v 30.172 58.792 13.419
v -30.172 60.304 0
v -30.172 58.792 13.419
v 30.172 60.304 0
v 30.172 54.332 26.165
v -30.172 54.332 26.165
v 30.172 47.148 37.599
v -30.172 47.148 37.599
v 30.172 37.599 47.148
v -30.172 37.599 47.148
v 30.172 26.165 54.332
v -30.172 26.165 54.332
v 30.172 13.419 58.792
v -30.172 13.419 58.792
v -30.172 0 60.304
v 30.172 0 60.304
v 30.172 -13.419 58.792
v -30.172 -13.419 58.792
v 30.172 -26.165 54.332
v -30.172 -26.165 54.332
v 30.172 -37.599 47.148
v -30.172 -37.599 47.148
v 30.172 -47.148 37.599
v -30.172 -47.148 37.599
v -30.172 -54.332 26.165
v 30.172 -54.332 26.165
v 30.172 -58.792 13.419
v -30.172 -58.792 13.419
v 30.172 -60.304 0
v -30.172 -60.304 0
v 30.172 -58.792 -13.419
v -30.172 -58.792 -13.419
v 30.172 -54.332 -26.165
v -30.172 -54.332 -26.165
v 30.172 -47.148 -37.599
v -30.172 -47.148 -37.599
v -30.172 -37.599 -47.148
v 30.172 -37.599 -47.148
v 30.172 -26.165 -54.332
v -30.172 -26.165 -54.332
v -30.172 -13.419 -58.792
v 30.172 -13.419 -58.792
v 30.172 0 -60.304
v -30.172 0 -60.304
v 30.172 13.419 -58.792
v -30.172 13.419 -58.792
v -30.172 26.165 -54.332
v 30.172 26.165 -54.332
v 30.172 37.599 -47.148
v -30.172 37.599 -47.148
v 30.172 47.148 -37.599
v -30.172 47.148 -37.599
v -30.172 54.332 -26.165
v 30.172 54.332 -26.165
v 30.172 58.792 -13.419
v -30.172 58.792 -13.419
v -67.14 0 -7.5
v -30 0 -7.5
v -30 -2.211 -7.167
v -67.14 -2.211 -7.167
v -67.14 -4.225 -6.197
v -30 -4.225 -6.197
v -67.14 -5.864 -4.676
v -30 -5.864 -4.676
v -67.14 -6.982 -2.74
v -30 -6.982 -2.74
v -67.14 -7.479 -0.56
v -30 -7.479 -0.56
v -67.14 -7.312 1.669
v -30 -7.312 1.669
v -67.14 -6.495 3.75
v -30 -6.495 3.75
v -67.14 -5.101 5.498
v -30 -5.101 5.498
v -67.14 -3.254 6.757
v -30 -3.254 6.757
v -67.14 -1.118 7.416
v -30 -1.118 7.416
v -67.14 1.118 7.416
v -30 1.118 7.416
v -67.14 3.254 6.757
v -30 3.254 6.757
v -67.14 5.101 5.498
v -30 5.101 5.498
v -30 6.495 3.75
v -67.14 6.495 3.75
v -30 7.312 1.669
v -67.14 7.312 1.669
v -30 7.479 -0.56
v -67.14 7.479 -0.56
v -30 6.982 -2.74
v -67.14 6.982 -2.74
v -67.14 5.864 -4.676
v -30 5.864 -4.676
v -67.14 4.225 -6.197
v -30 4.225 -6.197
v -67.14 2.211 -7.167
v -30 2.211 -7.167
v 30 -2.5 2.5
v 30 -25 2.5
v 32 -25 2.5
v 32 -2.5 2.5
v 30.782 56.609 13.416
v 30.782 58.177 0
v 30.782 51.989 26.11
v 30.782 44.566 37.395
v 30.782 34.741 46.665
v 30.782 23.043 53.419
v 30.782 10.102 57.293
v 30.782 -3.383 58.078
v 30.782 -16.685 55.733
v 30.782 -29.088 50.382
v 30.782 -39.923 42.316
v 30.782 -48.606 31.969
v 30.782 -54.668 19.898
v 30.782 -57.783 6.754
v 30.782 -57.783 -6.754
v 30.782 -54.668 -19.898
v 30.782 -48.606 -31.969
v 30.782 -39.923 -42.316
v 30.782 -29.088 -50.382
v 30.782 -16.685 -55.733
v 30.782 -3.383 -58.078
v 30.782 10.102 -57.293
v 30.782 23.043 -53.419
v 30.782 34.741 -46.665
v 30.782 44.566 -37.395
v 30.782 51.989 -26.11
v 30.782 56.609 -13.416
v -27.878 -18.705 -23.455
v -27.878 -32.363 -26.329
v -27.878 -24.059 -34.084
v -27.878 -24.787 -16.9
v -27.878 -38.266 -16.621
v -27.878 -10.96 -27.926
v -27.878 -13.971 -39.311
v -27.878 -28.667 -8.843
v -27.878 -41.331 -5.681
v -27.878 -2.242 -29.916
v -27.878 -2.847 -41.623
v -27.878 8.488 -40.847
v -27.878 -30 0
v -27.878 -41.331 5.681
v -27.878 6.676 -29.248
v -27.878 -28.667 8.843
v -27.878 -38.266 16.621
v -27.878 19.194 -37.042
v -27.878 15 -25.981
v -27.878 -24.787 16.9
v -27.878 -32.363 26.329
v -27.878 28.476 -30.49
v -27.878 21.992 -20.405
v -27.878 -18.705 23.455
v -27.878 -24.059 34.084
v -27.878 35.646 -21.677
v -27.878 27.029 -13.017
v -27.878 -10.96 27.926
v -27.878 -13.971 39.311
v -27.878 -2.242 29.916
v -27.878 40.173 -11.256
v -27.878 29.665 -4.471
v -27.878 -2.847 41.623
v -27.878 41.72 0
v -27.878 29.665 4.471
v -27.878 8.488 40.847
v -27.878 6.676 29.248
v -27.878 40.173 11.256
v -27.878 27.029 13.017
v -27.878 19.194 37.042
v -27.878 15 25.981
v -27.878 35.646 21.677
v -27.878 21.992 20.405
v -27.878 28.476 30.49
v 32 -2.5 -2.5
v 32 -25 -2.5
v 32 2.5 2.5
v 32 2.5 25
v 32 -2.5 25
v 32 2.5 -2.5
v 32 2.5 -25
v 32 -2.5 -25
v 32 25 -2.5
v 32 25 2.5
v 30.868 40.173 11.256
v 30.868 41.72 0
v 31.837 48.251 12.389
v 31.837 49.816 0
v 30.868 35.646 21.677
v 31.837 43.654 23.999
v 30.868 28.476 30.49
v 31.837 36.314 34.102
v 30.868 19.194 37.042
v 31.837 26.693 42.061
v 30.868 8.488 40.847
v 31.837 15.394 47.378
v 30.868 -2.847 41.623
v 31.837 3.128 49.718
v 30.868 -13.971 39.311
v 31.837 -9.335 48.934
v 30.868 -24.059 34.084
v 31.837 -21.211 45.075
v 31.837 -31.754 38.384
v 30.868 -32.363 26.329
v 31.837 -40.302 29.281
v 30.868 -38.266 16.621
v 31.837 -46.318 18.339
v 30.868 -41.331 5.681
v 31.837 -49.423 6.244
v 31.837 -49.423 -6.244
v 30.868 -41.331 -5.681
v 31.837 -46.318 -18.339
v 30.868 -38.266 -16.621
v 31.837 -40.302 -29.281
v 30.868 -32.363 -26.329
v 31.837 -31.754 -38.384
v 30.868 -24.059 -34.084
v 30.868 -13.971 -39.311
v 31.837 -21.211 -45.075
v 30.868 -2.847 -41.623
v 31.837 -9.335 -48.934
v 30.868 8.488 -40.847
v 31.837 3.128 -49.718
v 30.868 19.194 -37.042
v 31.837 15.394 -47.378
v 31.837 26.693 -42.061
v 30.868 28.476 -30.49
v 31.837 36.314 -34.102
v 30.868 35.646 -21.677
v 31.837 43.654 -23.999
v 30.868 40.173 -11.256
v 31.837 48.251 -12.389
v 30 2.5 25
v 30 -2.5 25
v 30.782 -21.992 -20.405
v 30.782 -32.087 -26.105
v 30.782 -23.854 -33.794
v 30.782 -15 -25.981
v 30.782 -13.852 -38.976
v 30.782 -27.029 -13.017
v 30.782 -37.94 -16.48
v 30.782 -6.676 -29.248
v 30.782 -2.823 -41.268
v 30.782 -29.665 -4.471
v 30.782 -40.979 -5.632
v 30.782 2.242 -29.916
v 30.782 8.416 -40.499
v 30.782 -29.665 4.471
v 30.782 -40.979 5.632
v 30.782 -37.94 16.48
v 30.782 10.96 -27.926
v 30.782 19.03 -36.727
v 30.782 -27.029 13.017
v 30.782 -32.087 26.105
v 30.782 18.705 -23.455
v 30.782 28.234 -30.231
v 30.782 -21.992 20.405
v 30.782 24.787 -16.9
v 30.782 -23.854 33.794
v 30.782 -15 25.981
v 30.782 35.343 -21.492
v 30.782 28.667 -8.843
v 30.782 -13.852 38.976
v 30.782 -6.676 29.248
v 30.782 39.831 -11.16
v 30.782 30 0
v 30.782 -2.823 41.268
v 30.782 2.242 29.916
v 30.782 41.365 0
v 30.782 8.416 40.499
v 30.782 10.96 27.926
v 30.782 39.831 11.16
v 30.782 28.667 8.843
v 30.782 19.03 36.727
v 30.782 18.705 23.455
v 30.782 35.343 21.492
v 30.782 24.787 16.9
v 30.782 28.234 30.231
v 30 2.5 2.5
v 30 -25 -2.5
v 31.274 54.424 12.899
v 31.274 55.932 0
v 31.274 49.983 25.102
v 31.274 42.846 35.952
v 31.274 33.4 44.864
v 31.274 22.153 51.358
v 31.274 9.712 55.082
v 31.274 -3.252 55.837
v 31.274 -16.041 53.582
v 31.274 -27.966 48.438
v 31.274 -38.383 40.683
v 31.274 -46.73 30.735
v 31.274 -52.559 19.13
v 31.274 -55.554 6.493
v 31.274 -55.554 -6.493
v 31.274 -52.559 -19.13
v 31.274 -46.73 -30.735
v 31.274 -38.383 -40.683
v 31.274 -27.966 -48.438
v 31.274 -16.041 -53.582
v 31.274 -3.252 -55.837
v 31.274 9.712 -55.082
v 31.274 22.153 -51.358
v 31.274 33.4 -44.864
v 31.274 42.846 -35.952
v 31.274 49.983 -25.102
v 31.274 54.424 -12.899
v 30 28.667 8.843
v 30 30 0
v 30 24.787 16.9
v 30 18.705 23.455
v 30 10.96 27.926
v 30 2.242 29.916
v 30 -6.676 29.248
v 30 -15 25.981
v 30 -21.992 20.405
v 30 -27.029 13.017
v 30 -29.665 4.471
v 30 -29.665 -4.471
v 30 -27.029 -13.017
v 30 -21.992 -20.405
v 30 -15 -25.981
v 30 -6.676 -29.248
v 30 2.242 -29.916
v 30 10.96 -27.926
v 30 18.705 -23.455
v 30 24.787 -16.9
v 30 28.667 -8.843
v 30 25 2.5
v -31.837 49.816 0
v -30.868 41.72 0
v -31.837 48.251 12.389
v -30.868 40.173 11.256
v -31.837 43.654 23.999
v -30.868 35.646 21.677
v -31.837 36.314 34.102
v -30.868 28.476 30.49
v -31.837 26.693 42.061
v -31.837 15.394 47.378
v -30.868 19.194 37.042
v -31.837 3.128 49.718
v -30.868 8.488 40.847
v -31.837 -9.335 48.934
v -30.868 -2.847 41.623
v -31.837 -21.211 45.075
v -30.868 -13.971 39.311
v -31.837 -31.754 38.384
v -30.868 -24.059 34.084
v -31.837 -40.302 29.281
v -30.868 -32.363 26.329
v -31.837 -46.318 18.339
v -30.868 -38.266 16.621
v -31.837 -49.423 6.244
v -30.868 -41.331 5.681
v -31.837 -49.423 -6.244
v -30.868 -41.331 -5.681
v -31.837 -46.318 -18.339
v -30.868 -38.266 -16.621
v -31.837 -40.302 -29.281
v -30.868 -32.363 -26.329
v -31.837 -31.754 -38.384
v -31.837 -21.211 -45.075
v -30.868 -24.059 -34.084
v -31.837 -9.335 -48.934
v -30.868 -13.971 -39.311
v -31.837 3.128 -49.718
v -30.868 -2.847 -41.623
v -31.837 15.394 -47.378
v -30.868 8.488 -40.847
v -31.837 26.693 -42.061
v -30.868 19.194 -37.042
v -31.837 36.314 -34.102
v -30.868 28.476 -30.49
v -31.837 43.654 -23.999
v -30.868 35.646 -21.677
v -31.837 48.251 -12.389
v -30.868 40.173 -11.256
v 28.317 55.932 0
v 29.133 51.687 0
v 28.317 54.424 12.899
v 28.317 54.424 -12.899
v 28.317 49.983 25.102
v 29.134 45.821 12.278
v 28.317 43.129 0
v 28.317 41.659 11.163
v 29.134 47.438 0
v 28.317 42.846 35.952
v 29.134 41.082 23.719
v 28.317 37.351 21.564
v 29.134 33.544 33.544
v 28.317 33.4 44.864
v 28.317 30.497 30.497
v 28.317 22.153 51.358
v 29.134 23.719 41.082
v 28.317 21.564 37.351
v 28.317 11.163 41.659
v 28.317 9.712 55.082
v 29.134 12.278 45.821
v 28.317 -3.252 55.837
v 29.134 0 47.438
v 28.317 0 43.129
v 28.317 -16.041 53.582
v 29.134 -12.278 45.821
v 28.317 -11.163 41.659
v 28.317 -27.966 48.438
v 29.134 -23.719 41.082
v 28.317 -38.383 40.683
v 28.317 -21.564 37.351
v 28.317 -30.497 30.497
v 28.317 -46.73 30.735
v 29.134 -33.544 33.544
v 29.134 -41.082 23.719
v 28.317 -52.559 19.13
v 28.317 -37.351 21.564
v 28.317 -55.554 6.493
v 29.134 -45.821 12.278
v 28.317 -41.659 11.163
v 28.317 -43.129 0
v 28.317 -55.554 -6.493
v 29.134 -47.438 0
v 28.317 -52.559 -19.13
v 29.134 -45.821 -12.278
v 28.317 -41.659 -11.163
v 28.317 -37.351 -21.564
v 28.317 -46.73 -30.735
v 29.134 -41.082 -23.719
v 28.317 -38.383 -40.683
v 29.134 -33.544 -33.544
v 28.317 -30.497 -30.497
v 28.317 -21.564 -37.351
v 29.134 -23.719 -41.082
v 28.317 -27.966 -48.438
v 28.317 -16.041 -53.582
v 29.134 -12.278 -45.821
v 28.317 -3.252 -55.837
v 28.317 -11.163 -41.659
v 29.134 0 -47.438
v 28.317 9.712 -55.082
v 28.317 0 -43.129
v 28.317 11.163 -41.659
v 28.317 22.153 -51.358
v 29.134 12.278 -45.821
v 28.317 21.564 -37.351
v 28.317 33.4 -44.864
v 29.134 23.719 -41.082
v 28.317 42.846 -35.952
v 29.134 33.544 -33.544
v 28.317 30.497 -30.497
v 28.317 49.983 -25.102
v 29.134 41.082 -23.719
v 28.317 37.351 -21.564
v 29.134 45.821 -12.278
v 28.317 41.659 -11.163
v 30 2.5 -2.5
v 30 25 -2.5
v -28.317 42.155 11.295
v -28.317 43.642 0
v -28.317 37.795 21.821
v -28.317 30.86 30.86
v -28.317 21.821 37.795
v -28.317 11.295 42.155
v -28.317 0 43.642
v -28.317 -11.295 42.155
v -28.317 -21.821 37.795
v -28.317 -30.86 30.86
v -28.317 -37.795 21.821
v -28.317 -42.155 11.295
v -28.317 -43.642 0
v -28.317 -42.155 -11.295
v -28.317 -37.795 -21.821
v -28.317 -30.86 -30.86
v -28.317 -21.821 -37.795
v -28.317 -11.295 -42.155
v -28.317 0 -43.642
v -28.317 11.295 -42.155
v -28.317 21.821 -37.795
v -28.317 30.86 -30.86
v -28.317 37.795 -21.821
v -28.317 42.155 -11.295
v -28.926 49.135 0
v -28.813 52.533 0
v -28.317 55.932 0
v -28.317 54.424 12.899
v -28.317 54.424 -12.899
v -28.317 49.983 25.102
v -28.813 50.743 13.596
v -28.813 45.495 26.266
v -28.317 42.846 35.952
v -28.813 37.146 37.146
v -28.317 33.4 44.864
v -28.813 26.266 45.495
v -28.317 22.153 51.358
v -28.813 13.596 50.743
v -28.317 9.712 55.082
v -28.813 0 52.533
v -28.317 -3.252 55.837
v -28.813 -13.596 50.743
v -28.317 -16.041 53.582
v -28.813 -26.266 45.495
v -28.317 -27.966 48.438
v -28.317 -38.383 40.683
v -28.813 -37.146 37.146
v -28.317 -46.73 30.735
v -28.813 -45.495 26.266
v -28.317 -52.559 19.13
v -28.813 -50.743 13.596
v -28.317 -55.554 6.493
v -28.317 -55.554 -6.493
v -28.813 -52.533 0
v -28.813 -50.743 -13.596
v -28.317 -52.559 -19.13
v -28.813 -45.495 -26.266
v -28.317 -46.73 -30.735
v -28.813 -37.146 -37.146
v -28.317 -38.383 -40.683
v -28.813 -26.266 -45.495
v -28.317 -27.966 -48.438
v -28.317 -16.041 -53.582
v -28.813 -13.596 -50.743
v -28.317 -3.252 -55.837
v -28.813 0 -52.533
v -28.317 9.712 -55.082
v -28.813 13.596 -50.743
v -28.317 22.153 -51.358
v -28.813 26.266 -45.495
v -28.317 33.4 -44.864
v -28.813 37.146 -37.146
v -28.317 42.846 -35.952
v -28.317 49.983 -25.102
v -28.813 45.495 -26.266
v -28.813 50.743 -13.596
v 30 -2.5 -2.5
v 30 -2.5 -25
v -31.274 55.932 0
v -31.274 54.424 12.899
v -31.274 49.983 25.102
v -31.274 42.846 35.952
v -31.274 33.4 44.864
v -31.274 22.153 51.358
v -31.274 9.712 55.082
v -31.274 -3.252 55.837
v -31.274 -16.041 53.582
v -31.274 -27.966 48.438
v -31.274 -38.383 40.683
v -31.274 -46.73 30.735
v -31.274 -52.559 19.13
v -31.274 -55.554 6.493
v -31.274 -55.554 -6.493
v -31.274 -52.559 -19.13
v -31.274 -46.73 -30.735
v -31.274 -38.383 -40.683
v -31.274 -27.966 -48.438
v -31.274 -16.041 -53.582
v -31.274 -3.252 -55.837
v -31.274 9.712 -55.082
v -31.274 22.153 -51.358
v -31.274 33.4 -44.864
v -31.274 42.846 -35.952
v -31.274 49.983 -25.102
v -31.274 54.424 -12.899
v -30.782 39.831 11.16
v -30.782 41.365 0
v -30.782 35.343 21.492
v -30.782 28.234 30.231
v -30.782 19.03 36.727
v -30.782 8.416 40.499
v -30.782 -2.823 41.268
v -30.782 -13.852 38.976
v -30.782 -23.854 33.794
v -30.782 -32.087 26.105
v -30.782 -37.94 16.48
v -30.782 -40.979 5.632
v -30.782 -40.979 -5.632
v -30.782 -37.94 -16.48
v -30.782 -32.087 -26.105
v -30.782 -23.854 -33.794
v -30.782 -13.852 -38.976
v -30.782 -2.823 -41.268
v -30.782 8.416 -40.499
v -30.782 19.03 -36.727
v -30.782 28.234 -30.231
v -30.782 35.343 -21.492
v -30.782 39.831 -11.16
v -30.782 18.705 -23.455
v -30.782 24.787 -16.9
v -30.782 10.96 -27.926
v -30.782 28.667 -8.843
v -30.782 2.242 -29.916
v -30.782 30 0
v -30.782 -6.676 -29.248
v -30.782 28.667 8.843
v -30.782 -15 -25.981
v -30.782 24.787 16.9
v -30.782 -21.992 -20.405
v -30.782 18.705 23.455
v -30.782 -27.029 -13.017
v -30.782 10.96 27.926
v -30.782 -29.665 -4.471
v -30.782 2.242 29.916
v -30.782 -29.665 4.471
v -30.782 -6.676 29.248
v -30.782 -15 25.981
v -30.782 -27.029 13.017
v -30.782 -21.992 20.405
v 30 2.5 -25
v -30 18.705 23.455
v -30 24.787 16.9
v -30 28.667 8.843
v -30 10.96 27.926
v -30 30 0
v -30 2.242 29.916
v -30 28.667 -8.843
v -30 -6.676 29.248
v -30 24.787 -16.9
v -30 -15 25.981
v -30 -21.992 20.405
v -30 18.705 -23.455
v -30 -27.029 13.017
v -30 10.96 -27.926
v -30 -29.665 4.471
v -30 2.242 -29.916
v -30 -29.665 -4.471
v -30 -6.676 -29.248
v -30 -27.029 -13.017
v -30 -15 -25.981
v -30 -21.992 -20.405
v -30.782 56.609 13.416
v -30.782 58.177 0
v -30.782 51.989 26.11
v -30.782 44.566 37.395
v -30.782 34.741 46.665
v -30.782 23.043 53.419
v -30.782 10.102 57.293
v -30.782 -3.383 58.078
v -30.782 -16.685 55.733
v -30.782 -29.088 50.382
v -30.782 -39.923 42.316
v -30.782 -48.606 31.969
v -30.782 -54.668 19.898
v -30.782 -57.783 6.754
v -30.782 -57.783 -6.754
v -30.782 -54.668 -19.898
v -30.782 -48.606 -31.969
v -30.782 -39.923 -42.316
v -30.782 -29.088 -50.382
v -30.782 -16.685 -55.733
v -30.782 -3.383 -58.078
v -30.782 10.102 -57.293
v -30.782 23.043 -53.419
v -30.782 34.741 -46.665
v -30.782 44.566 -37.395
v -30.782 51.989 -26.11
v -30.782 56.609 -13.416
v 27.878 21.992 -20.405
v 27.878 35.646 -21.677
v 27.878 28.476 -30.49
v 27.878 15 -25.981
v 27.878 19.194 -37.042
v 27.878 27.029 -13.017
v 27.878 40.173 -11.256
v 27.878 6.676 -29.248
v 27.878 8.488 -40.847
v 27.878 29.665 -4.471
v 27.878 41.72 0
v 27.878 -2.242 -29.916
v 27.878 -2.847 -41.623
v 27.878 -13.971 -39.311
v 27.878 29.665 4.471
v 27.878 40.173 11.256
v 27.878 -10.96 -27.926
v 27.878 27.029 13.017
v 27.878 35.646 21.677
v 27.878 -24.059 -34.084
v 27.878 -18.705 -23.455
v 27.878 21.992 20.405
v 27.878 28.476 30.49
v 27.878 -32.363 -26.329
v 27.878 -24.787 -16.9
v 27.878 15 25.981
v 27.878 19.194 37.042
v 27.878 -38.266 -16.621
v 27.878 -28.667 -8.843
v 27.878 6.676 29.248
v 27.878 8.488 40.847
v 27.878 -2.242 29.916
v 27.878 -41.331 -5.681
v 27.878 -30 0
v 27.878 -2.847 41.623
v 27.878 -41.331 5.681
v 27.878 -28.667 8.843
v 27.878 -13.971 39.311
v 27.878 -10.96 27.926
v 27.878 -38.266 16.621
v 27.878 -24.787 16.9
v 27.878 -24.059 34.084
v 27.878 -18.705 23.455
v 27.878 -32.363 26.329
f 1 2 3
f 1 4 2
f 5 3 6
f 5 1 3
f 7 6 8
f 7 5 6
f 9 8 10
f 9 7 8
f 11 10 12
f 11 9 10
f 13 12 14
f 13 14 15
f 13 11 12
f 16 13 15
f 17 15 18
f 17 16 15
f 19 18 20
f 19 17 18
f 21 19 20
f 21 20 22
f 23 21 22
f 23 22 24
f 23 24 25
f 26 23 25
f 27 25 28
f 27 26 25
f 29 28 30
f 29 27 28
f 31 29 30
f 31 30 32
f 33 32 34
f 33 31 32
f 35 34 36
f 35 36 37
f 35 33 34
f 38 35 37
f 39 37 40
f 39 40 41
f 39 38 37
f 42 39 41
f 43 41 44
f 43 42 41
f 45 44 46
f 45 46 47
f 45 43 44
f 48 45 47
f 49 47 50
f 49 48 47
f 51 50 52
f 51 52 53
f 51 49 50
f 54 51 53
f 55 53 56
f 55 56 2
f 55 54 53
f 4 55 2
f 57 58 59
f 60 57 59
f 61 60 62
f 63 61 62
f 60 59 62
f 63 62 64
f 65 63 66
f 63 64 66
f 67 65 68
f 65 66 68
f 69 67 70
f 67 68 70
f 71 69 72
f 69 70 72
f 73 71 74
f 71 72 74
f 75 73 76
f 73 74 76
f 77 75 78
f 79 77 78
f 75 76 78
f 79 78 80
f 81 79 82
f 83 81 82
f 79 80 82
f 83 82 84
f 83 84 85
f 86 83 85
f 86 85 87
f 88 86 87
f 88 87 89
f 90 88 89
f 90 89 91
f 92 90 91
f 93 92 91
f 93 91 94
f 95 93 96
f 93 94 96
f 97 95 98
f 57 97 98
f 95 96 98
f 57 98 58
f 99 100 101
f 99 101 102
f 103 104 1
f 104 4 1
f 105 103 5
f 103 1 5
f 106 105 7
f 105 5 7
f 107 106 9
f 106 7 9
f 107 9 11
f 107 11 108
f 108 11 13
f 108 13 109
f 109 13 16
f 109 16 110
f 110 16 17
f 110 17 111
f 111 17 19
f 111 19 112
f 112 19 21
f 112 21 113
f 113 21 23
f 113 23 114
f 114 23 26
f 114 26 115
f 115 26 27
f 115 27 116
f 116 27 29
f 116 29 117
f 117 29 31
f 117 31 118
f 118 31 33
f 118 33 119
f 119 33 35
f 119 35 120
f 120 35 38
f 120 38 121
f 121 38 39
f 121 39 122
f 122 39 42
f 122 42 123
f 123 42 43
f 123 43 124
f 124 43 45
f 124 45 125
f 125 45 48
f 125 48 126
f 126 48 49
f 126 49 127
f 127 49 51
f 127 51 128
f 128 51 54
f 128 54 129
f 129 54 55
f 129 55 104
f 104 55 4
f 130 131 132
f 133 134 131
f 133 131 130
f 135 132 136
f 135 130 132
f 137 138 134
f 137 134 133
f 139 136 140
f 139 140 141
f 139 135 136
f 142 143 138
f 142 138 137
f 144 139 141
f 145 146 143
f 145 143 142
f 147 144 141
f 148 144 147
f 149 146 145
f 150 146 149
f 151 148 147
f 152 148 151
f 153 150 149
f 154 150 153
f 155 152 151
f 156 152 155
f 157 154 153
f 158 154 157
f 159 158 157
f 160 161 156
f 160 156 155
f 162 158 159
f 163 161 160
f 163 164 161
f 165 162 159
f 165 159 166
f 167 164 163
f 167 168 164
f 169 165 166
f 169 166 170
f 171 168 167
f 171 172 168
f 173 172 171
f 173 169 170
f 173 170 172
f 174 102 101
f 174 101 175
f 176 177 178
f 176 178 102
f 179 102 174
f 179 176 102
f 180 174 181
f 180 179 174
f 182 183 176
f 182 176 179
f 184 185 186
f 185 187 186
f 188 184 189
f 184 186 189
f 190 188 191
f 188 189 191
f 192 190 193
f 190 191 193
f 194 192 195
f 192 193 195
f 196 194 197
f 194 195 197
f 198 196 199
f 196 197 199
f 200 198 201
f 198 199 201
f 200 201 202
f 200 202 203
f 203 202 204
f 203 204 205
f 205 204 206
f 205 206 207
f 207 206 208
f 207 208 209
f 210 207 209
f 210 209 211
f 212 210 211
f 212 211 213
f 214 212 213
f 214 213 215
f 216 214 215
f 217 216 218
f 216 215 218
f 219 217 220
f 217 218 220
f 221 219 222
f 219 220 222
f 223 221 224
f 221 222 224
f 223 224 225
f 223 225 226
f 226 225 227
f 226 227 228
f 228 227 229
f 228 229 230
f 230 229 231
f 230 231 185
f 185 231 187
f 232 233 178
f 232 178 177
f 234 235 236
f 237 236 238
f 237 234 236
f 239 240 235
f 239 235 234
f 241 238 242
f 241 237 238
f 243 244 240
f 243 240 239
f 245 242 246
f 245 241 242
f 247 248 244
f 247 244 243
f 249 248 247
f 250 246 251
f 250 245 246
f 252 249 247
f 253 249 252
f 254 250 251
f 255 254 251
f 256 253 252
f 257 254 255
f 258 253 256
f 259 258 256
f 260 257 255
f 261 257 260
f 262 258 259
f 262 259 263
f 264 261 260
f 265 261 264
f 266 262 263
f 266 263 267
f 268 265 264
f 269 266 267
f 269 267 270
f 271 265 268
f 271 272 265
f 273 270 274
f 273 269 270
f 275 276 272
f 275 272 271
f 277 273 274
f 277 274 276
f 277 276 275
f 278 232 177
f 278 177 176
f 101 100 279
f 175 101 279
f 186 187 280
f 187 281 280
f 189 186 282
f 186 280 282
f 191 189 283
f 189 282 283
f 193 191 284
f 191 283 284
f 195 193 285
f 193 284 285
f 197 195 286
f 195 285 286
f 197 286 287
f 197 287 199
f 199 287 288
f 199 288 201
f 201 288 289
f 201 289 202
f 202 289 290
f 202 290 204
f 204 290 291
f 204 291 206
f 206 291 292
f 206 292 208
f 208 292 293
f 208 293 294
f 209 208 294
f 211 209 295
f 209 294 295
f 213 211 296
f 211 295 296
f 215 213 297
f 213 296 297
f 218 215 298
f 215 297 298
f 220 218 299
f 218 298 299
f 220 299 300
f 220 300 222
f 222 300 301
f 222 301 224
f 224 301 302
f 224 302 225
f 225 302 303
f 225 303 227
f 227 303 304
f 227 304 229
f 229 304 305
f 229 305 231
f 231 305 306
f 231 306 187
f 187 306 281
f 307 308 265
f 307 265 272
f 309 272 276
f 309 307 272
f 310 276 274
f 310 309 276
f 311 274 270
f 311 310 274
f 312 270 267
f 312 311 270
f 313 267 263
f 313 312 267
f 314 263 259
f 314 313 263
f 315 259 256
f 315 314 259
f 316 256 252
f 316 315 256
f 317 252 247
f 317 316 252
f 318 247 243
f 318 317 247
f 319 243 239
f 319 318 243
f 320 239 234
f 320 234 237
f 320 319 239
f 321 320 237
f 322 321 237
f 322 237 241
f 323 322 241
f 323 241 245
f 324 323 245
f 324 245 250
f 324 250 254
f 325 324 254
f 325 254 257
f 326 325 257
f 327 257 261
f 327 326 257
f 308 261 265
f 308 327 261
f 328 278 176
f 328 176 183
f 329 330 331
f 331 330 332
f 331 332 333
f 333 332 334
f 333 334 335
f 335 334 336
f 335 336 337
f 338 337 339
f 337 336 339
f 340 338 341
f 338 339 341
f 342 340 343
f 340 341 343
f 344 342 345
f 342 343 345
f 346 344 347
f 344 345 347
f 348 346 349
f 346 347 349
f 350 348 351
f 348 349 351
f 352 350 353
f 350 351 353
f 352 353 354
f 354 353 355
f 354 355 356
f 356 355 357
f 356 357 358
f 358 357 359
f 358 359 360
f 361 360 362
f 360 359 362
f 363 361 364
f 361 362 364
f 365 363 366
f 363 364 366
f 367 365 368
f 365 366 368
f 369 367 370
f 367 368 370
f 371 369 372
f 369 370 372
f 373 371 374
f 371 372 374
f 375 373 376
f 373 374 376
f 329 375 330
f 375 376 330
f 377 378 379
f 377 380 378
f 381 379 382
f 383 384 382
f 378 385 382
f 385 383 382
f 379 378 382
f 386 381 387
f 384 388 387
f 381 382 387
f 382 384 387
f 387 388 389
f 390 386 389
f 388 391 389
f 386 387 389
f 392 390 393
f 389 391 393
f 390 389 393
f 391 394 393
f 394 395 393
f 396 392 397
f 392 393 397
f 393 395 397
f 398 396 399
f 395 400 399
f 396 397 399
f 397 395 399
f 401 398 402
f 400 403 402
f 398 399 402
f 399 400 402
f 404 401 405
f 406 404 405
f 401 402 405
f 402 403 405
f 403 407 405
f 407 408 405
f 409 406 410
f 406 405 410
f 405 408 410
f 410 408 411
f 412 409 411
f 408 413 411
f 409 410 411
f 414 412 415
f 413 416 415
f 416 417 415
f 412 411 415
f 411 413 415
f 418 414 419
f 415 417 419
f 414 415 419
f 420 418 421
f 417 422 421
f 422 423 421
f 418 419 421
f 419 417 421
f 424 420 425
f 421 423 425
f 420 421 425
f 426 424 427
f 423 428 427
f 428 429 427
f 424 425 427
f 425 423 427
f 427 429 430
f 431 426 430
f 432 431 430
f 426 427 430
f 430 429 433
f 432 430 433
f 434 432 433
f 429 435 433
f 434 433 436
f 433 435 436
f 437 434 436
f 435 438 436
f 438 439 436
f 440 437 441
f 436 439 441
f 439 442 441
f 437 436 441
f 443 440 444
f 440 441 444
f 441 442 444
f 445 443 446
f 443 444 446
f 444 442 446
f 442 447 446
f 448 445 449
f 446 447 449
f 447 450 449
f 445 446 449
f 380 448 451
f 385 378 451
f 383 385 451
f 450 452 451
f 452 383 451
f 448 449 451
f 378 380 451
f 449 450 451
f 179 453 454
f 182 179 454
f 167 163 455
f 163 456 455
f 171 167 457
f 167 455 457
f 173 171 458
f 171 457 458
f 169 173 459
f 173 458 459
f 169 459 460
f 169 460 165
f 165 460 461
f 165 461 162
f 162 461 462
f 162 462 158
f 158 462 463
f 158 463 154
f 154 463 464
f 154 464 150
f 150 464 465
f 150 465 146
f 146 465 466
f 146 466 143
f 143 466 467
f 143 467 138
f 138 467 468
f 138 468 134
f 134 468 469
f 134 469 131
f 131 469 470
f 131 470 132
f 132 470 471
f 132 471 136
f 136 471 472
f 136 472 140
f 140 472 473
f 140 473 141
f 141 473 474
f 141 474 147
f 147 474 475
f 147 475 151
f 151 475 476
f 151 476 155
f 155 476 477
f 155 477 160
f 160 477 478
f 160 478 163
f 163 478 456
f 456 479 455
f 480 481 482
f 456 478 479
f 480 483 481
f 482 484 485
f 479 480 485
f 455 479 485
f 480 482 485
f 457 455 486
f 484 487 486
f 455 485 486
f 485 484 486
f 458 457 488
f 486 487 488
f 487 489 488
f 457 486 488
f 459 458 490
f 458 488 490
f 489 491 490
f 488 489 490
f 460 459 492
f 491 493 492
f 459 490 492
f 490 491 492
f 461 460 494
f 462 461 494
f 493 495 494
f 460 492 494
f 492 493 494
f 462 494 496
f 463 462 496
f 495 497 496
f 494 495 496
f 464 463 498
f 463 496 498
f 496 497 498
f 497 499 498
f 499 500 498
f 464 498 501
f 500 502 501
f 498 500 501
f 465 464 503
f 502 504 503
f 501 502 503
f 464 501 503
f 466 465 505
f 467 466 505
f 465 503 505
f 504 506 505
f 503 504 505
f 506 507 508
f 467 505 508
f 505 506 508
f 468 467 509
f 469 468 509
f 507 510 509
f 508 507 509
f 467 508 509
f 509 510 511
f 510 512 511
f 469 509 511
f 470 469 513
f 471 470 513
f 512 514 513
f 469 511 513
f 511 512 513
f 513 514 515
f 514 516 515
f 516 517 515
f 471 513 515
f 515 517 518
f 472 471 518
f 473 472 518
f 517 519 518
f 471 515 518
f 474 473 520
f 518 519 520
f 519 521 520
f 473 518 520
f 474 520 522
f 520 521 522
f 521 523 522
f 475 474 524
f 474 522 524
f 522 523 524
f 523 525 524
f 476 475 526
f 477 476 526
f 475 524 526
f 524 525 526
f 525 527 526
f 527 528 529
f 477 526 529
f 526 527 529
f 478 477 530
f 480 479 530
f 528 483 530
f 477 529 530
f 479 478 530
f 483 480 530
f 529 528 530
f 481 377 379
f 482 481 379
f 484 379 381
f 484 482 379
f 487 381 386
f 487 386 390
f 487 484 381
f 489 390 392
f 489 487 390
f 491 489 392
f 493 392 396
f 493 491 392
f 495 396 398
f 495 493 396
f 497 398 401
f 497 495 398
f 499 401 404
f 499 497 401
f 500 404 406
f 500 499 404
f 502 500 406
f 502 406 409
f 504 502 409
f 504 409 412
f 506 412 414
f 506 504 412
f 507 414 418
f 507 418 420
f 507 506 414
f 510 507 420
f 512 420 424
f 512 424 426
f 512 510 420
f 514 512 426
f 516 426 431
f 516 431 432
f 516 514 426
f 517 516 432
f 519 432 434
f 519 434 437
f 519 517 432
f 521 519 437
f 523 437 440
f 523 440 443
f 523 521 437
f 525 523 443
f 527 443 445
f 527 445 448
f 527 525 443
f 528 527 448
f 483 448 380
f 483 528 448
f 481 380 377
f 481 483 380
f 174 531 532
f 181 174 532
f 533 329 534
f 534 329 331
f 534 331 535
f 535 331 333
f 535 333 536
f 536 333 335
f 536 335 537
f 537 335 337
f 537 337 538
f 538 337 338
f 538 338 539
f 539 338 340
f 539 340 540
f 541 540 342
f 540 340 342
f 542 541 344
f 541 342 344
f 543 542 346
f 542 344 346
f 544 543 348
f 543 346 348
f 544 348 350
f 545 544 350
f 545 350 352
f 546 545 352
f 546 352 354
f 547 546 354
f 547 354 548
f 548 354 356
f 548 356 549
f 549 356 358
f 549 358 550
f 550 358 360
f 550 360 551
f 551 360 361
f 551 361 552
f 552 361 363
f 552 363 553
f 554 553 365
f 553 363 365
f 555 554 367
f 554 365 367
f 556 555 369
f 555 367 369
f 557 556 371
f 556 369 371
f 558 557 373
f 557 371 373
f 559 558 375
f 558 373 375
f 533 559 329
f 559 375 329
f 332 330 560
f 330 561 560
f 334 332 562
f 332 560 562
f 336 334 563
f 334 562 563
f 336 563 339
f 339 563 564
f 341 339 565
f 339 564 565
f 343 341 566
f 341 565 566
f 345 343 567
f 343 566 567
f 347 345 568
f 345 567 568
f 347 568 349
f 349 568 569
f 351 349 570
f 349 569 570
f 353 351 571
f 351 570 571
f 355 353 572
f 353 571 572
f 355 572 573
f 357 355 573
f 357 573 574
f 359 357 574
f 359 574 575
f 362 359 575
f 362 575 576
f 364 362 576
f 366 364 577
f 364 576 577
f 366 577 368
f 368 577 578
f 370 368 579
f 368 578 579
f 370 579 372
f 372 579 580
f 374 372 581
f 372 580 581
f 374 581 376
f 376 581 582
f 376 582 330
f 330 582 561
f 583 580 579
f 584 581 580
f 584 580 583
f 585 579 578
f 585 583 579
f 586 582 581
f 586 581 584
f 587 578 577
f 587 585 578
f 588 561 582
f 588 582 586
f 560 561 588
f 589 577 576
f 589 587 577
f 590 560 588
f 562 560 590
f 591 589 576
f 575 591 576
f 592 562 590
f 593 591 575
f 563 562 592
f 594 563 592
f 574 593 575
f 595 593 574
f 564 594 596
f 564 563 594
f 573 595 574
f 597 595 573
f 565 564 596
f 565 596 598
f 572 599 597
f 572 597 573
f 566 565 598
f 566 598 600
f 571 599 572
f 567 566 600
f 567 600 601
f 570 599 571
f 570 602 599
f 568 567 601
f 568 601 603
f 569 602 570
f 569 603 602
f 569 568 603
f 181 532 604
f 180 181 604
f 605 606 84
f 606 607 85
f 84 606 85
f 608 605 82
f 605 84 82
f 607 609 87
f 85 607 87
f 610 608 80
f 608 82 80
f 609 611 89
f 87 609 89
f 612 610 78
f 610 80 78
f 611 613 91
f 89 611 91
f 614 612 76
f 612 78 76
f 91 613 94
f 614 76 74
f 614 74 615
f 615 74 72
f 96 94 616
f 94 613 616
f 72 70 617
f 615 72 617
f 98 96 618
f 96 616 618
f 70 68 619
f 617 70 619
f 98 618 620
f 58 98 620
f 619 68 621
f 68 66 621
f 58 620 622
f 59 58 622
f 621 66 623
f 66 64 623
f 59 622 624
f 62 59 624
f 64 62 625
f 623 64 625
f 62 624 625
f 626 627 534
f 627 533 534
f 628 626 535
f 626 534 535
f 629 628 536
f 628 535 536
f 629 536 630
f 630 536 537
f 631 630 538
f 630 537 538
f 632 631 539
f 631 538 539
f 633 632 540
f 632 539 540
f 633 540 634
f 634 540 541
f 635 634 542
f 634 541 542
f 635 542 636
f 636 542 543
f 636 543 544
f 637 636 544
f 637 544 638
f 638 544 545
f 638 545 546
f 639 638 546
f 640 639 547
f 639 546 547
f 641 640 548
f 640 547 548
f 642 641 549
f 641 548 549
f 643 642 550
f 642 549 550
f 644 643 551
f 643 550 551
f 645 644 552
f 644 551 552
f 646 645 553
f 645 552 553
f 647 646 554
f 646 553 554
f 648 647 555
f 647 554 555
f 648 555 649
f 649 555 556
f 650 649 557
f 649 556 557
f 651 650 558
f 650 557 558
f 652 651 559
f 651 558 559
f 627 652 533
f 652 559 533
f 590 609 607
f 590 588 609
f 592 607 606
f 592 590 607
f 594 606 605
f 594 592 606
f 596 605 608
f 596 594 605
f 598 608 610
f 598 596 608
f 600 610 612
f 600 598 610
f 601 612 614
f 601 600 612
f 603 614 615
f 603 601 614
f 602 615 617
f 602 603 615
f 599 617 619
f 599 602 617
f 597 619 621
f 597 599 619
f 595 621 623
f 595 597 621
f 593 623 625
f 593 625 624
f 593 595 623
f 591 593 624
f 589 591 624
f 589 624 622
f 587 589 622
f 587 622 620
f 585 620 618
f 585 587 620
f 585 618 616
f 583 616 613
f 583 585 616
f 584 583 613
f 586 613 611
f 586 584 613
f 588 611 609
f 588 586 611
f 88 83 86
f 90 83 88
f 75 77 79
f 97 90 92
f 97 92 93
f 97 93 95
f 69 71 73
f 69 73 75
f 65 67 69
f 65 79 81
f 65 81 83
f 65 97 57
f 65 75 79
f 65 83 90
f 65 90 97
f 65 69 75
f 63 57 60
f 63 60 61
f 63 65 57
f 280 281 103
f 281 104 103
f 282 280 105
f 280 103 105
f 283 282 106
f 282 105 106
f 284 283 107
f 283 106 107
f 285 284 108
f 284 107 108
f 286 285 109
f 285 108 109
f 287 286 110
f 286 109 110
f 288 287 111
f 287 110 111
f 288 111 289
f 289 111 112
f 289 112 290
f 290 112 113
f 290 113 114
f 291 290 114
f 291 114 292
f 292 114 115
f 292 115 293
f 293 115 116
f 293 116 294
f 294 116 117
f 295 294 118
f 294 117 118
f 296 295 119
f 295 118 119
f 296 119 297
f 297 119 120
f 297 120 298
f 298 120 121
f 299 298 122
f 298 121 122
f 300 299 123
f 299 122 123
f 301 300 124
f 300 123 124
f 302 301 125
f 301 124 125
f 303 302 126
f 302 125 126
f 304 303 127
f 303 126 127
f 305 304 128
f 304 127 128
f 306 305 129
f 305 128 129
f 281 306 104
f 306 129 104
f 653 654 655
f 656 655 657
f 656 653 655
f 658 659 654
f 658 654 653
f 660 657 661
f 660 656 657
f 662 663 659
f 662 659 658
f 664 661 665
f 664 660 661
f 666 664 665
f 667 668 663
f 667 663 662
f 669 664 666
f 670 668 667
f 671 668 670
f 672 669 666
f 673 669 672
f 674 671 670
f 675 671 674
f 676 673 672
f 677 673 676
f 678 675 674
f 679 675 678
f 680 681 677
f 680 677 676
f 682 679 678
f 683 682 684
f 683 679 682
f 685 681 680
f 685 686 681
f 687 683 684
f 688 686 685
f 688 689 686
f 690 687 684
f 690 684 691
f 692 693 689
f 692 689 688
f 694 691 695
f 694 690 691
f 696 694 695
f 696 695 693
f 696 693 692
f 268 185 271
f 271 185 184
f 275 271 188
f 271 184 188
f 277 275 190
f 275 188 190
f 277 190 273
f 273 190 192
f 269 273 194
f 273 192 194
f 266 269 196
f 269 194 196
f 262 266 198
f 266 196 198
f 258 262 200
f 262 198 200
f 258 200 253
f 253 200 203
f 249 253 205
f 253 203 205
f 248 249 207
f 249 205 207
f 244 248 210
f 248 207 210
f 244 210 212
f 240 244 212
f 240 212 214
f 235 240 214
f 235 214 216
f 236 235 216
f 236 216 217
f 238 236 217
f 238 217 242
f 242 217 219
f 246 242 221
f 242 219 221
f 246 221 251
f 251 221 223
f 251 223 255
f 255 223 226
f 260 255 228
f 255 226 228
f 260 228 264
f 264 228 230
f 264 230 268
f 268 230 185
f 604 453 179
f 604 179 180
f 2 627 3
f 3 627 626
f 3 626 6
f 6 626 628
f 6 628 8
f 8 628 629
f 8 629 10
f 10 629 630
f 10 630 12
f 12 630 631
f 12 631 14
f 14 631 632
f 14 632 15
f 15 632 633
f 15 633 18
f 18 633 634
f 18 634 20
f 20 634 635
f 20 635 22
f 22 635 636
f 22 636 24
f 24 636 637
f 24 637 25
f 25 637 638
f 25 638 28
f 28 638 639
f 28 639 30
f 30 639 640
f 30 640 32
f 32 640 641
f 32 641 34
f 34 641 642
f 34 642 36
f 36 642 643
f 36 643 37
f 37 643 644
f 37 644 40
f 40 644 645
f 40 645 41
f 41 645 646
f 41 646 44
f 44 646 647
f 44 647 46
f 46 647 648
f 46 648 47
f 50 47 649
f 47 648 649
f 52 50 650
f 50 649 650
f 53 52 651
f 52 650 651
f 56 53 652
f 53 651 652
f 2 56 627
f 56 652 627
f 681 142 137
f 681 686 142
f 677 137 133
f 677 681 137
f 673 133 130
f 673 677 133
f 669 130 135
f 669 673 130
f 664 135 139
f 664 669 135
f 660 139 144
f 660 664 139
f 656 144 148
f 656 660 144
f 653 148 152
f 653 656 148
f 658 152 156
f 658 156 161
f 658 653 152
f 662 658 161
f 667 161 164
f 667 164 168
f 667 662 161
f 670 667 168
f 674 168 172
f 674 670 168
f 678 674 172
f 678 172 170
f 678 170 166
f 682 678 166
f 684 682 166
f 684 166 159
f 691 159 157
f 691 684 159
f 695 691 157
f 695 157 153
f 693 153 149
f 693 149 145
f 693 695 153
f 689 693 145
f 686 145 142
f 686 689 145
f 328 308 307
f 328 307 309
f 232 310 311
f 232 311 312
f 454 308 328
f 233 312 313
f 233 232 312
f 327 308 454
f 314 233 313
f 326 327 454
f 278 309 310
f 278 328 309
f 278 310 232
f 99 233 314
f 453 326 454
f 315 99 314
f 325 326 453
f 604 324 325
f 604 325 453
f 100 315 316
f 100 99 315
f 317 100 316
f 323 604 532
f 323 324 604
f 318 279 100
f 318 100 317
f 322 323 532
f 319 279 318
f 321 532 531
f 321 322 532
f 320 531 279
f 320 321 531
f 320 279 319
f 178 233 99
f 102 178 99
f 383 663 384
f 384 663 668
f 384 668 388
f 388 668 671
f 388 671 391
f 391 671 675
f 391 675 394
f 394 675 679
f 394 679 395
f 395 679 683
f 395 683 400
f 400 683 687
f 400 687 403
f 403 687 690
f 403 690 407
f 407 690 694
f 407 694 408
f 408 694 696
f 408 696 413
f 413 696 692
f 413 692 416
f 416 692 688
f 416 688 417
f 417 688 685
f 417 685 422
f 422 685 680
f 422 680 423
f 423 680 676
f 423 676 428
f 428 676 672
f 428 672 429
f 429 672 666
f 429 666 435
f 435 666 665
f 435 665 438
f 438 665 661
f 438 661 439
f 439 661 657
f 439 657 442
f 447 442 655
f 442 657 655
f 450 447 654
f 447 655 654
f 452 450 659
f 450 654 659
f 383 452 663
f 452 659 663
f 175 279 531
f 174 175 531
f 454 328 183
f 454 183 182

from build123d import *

# Parameters (mm, degrees)
REVOLVE_1_OUTLINE_W   = 0.355269541
REVOLVE_1_OUTLINE_H   = 0.438478825
REVOLVE_1_OUTLINE_W_2 = 11.364624133
REVOLVE_1_OUTLINE_W_3 = 4.372569082
REVOLVE_1_OUTLINE_H_2 = 55.75634902
REVOLVE_1_OUTLINE_H_3 = 1.854936884
REVOLVE_1_OUTLINE_W_4 = 14.211965544
REVOLVE_1_OUTLINE_H_4 = 0.61022171
SKETCH_2_R            = 30
EXTRUDE_1_DEPTH       = 30
SKETCH_3_R            = 7.5
EXTRUDE_2_DEPTH       = 37.14
SKETCH_4_W            = 5
SKETCH_4_H            = 22.5
SKETCH_4_W_2          = 22.5
SKETCH_4_H_2          = 5
EXTRUDE_3_DEPTH       = 2


# Read off the part's stored shape, not the designer's step: 회전1
with BuildPart() as part:
    # 회전1 outline → 회전1 (revolve)
    with BuildSketch(Plane.YX):
        with Locations((41.542258903, -28.097413923)):
            Rectangle(REVOLVE_1_OUTLINE_W, REVOLVE_1_OUTLINE_H)
        with BuildLine():
            add(Edge.make_bspline(
                [(41.719893674, -27.87817451), (41.894749248, -27.921618592), (42.252720208, -28.01137838), (42.873298399, -28.15700866), (43.341279515, -28.256769587), (43.642191366, -28.316653335)],
                knots=[0.117139278, 0.117139278, 0.117139278, 0.117139278, 0.14529069, 0.173442101, 0.224513922, 0.224513922, 0.224513922, 0.224513922], degree=3))
            Line((41.719893674, -27.87817451), (41.719893674, -28.316653335))
            Line((41.719893674, -28.316653335), (43.642191366, -28.316653335))
        make_face()
        with BuildLine():
            add(Edge.make_bspline(
                [(43.642191366, -28.316653335), (43.673012094, -28.322786894), (44.367114713, -28.459908676), (46.367881136, -28.788520691), (49.637320271, -29.015805628), (53.021708434, -28.821695589), (55.131271584, -28.478533008), (55.931859218, -28.316653335)],
                knots=[0.224513922, 0.224513922, 0.224513922, 0.224513922, 0.229744924, 0.34235057, 0.567561862, 0.792773154, 0.932194296, 0.932194296, 0.932194296, 0.932194296], degree=3))
            Line((43.642191366, -28.316653335), (41.719893674, -28.316653335))
            Line((41.719893674, -28.316653335), (41.719893674, -30.171590219))
            Line((41.719893674, -30.171590219), (55.931859218, -30.171590219))
            Line((55.931859218, -30.171590219), (55.931859218, -28.316653335))
        make_face()
        with Locations((35.682312067, -28.097413923)):
            Rectangle(REVOLVE_1_OUTLINE_W_2, REVOLVE_1_OUTLINE_H)
        with Locations((58.118143759, -28.097413923)):
            Rectangle(REVOLVE_1_OUTLINE_W_3, REVOLVE_1_OUTLINE_H)
        with Locations((58.118143759, 0)):
            Rectangle(REVOLVE_1_OUTLINE_W_3, REVOLVE_1_OUTLINE_H_2)
        with BuildLine():
            Line((41.719893674, 28.316653335), (41.719893674, 27.87817451))
            add(Edge.make_bspline(
                [(43.128876316, 28.316653335), (42.973861456, 28.272694047), (42.669494175, 28.183372992), (42.227403007, 28.044794313), (41.884836208, 27.931979132), (41.719893674, 27.87817451)],
                knots=[0.937972384, 0.937972384, 0.937972384, 0.937972384, 0.966974102, 0.995182728, 1.023391355, 1.023391355, 1.023391355, 1.023391355], degree=3))
            Line((43.128876316, 28.316653335), (41.719893674, 28.316653335))
        make_face()
        with Locations((41.542258903, 28.097413923)):
            Rectangle(REVOLVE_1_OUTLINE_W, REVOLVE_1_OUTLINE_H)
        with Locations((41.542258903, -29.244121777)):
            Rectangle(REVOLVE_1_OUTLINE_W, REVOLVE_1_OUTLINE_H_3)
        with Locations((58.118143759, -29.244121777)):
            Rectangle(REVOLVE_1_OUTLINE_W_3, REVOLVE_1_OUTLINE_H_3)
        with Locations((35.682312067, -29.244121777)):
            Rectangle(REVOLVE_1_OUTLINE_W_2, REVOLVE_1_OUTLINE_H_3)
        with Locations((35.682312067, 28.097413923)):
            Rectangle(REVOLVE_1_OUTLINE_W_2, REVOLVE_1_OUTLINE_H)
        with Locations((58.118143759, 28.097413923)):
            Rectangle(REVOLVE_1_OUTLINE_W_3, REVOLVE_1_OUTLINE_H)
        with BuildLine():
            Line((41.719893674, 28.316653335), (43.128876316, 28.316653335))
            add(Edge.make_bspline(
                [(55.931859218, 28.316653335), (55.350466054, 28.484554725), (54.483083768, 28.700477141), (53.332821917, 28.919070087), (52.621816991, 29.026887301), (51.140275095, 29.207221888), (48.779721438, 29.304602769), (45.95584246, 28.998713875), (44.028351242, 28.564756145), (43.275412999, 28.358208372), (43.128876316, 28.316653335)],
                knots=[0.120715306, 0.120715306, 0.120715306, 0.120715306, 0.233549812, 0.285972839, 0.342390092, 0.370598718, 0.57205333, 0.797722342, 0.910556849, 0.937972384, 0.937972384, 0.937972384, 0.937972384], degree=3))
            Line((55.931859218, 28.316653335), (55.931859218, 30.171590219))
            Line((55.931859218, 30.171590219), (41.719893674, 30.171590219))
            Line((41.719893674, 30.171590219), (41.719893674, 28.316653335))
        make_face()
        with Locations((41.542258903, 29.244121777)):
            Rectangle(REVOLVE_1_OUTLINE_W, REVOLVE_1_OUTLINE_H_3)
        with Locations((48.825876446, -30.476701074)):
            Rectangle(REVOLVE_1_OUTLINE_W_4, REVOLVE_1_OUTLINE_H_4)
        with Locations((41.542258903, -30.476701074)):
            Rectangle(REVOLVE_1_OUTLINE_W, REVOLVE_1_OUTLINE_H_4)
        with BuildLine():
            Line((60.3044283, -30.171590219), (55.931859218, -30.171590219))
            Line((55.931859218, -30.171590219), (55.931859218, -30.781811929))
            Line((55.931859218, -30.781811929), (58.176696805, -30.781811929))
            add(Edge.make_bspline(
                [(60.3044283, -30.171590219), (59.242057092, -30.511353598), (58.176696805, -30.781811929)],
                knots=[0, 0, 0, 0.113573553, 0.113573553, 0.113573553], degree=2))
        make_face()
        with Locations((35.682312067, -30.476701074)):
            Rectangle(REVOLVE_1_OUTLINE_W_2, REVOLVE_1_OUTLINE_H_4)
        with Locations((35.682312067, 29.244121777)):
            Rectangle(REVOLVE_1_OUTLINE_W_2, REVOLVE_1_OUTLINE_H_3)
        with Locations((58.118143759, 29.244121777)):
            Rectangle(REVOLVE_1_OUTLINE_W_3, REVOLVE_1_OUTLINE_H_3)
        with Locations((41.542258903, 30.476701074)):
            Rectangle(REVOLVE_1_OUTLINE_W, REVOLVE_1_OUTLINE_H_4)
        with Locations((48.825876446, 30.476701074)):
            Rectangle(REVOLVE_1_OUTLINE_W_4, REVOLVE_1_OUTLINE_H_4)
        with BuildLine():
            Line((55.931859218, -30.781811929), (41.719893674, -30.781811929))
            Line((41.719893674, -30.781811929), (41.719893674, -30.868243844))
            add(Edge.make_bspline(
                [(49.816181075, -31.837257545), (45.788933817, -31.837257541), (41.719893674, -30.868243844)],
                knots=[0.556786778, 0.556786778, 0.556786778, 0.981464752, 0.981464752, 0.981464752], degree=2))
            add(Edge.make_bspline(
                [(55.931859218, -31.274158213), (52.886163188, -31.837257547), (49.816181075, -31.837257545)],
                knots=[0.233053543, 0.233053543, 0.233053543, 0.556786778, 0.556786778, 0.556786778], degree=2))
            Line((55.931859218, -31.274158213), (55.931859218, -30.781811929))
        make_face()
        with BuildLine():
            Line((41.719893674, -30.868243844), (41.719893674, -30.781811929))
            Line((41.719893674, -30.781811929), (41.364624133, -30.781811929))
            add(Edge.make_bspline(
                [(41.719893674, -30.868243844), (41.54229871, -30.825950834), (41.364624133, -30.781811929)],
                knots=[0.981464752, 0.981464752, 0.981464752, 1, 1, 1], degree=2))
        make_face()
        with BuildLine():
            Line((58.176696805, -30.781811929), (55.931859218, -30.781811929))
            Line((55.931859218, -30.781811929), (55.931859218, -31.274158213))
            add(Edge.make_bspline(
                [(58.176696805, -30.781811929), (57.055932041, -31.066335551), (55.931859218, -31.274158213)],
                knots=[0.113573553, 0.113573553, 0.113573553, 0.233053543, 0.233053543, 0.233053543], degree=2))
        make_face()
        with Locations((35.682312067, 30.476701074)):
            Rectangle(REVOLVE_1_OUTLINE_W_2, REVOLVE_1_OUTLINE_H_4)
        with BuildLine():
            Line((55.931859218, 30.781811929), (55.931859218, 30.171590219))
            Line((55.931859218, 30.171590219), (60.3044283, 30.171590219))
            add(Edge.make_bspline(
                [(58.176696805, 30.781811929), (59.242057092, 30.511353598), (60.3044283, 30.171590219)],
                knots=[0.886426447, 0.886426447, 0.886426447, 1, 1, 1], degree=2))
            Line((58.176696805, 30.781811929), (55.931859218, 30.781811929))
        make_face()
        with BuildLine():
            Line((41.364624133, 30.781811929), (41.719893674, 30.781811929))
            Line((41.719893674, 30.781811929), (41.719893674, 30.868243844))
            add(Edge.make_bspline(
                [(41.364624133, 30.781811929), (41.54229871, 30.825950834), (41.719893674, 30.868243844)],
                knots=[0, 0, 0, 0.018535248, 0.018535248, 0.018535248], degree=2))
        make_face()
        with BuildLine():
            Line((41.719893674, 30.868243844), (41.719893674, 30.781811929))
            Line((41.719893674, 30.781811929), (55.931859218, 30.781811929))
            Line((55.931859218, 30.781811929), (55.931859218, 31.274158213))
            add(Edge.make_bspline(
                [(49.816181262, 31.837257545), (52.886163281, 31.83725753), (55.931859218, 31.274158213)],
                knots=[0.443213232, 0.443213232, 0.443213232, 0.766946457, 0.766946457, 0.766946457], degree=2))
            add(Edge.make_bspline(
                [(41.719893674, 30.868243844), (45.788933912, 31.837257564), (49.816181262, 31.837257545)],
                knots=[0.018535248, 0.018535248, 0.018535248, 0.443213232, 0.443213232, 0.443213232], degree=2))
        make_face()
        with BuildLine():
            Line((55.931859218, 31.274158213), (55.931859218, 30.781811929))
            Line((55.931859218, 30.781811929), (58.176696805, 30.781811929))
            add(Edge.make_bspline(
                [(55.931859218, 31.274158213), (57.055932041, 31.066335551), (58.176696805, 30.781811929)],
                knots=[0.766946457, 0.766946457, 0.766946457, 0.886426447, 0.886426447, 0.886426447], degree=2))
        make_face()
    revolve(axis=Axis((0, 0, 0), (1, 0, 0)))

    # 스케치2 → 보스-돌출1 (add, symmetric)
    with BuildSketch(Plane(origin=(0, 0, 0), x_dir=(0, 0, -1), z_dir=(1, 0, 0))):
        with Locations(Location((0, 0, 0), (0, 0, 270))):
            Circle(SKETCH_2_R)
    extrude(amount=EXTRUDE_1_DEPTH, both=True)

    # 스케치3 → 보스-돌출2 (add)
    with BuildSketch(Plane.ZY.offset(30)):
        with Locations(Location((0, 0, 0), (0, 0, 180))):
            Circle(SKETCH_3_R)
    extrude(amount=EXTRUDE_2_DEPTH)

    # 스케치4 → 보스-돌출3 (add)
    with BuildSketch(Plane(origin=(30, 0, 0), x_dir=(0, 0, -1), z_dir=(1, 0, 0))):
        with Locations((0, 13.75)):
            Rectangle(SKETCH_4_W, SKETCH_4_H)
        with Locations((-13.75, 0)):
            Rectangle(SKETCH_4_W_2, SKETCH_4_H_2)
        Rectangle(SKETCH_4_W, SKETCH_4_H_2)
        with Locations((13.75, 0)):
            Rectangle(SKETCH_4_W_2, SKETCH_4_H_2)
        with Locations((0, -13.75)):
            Rectangle(SKETCH_4_W, SKETCH_4_H)
    extrude(amount=EXTRUDE_3_DEPTH)


solid = part.part
